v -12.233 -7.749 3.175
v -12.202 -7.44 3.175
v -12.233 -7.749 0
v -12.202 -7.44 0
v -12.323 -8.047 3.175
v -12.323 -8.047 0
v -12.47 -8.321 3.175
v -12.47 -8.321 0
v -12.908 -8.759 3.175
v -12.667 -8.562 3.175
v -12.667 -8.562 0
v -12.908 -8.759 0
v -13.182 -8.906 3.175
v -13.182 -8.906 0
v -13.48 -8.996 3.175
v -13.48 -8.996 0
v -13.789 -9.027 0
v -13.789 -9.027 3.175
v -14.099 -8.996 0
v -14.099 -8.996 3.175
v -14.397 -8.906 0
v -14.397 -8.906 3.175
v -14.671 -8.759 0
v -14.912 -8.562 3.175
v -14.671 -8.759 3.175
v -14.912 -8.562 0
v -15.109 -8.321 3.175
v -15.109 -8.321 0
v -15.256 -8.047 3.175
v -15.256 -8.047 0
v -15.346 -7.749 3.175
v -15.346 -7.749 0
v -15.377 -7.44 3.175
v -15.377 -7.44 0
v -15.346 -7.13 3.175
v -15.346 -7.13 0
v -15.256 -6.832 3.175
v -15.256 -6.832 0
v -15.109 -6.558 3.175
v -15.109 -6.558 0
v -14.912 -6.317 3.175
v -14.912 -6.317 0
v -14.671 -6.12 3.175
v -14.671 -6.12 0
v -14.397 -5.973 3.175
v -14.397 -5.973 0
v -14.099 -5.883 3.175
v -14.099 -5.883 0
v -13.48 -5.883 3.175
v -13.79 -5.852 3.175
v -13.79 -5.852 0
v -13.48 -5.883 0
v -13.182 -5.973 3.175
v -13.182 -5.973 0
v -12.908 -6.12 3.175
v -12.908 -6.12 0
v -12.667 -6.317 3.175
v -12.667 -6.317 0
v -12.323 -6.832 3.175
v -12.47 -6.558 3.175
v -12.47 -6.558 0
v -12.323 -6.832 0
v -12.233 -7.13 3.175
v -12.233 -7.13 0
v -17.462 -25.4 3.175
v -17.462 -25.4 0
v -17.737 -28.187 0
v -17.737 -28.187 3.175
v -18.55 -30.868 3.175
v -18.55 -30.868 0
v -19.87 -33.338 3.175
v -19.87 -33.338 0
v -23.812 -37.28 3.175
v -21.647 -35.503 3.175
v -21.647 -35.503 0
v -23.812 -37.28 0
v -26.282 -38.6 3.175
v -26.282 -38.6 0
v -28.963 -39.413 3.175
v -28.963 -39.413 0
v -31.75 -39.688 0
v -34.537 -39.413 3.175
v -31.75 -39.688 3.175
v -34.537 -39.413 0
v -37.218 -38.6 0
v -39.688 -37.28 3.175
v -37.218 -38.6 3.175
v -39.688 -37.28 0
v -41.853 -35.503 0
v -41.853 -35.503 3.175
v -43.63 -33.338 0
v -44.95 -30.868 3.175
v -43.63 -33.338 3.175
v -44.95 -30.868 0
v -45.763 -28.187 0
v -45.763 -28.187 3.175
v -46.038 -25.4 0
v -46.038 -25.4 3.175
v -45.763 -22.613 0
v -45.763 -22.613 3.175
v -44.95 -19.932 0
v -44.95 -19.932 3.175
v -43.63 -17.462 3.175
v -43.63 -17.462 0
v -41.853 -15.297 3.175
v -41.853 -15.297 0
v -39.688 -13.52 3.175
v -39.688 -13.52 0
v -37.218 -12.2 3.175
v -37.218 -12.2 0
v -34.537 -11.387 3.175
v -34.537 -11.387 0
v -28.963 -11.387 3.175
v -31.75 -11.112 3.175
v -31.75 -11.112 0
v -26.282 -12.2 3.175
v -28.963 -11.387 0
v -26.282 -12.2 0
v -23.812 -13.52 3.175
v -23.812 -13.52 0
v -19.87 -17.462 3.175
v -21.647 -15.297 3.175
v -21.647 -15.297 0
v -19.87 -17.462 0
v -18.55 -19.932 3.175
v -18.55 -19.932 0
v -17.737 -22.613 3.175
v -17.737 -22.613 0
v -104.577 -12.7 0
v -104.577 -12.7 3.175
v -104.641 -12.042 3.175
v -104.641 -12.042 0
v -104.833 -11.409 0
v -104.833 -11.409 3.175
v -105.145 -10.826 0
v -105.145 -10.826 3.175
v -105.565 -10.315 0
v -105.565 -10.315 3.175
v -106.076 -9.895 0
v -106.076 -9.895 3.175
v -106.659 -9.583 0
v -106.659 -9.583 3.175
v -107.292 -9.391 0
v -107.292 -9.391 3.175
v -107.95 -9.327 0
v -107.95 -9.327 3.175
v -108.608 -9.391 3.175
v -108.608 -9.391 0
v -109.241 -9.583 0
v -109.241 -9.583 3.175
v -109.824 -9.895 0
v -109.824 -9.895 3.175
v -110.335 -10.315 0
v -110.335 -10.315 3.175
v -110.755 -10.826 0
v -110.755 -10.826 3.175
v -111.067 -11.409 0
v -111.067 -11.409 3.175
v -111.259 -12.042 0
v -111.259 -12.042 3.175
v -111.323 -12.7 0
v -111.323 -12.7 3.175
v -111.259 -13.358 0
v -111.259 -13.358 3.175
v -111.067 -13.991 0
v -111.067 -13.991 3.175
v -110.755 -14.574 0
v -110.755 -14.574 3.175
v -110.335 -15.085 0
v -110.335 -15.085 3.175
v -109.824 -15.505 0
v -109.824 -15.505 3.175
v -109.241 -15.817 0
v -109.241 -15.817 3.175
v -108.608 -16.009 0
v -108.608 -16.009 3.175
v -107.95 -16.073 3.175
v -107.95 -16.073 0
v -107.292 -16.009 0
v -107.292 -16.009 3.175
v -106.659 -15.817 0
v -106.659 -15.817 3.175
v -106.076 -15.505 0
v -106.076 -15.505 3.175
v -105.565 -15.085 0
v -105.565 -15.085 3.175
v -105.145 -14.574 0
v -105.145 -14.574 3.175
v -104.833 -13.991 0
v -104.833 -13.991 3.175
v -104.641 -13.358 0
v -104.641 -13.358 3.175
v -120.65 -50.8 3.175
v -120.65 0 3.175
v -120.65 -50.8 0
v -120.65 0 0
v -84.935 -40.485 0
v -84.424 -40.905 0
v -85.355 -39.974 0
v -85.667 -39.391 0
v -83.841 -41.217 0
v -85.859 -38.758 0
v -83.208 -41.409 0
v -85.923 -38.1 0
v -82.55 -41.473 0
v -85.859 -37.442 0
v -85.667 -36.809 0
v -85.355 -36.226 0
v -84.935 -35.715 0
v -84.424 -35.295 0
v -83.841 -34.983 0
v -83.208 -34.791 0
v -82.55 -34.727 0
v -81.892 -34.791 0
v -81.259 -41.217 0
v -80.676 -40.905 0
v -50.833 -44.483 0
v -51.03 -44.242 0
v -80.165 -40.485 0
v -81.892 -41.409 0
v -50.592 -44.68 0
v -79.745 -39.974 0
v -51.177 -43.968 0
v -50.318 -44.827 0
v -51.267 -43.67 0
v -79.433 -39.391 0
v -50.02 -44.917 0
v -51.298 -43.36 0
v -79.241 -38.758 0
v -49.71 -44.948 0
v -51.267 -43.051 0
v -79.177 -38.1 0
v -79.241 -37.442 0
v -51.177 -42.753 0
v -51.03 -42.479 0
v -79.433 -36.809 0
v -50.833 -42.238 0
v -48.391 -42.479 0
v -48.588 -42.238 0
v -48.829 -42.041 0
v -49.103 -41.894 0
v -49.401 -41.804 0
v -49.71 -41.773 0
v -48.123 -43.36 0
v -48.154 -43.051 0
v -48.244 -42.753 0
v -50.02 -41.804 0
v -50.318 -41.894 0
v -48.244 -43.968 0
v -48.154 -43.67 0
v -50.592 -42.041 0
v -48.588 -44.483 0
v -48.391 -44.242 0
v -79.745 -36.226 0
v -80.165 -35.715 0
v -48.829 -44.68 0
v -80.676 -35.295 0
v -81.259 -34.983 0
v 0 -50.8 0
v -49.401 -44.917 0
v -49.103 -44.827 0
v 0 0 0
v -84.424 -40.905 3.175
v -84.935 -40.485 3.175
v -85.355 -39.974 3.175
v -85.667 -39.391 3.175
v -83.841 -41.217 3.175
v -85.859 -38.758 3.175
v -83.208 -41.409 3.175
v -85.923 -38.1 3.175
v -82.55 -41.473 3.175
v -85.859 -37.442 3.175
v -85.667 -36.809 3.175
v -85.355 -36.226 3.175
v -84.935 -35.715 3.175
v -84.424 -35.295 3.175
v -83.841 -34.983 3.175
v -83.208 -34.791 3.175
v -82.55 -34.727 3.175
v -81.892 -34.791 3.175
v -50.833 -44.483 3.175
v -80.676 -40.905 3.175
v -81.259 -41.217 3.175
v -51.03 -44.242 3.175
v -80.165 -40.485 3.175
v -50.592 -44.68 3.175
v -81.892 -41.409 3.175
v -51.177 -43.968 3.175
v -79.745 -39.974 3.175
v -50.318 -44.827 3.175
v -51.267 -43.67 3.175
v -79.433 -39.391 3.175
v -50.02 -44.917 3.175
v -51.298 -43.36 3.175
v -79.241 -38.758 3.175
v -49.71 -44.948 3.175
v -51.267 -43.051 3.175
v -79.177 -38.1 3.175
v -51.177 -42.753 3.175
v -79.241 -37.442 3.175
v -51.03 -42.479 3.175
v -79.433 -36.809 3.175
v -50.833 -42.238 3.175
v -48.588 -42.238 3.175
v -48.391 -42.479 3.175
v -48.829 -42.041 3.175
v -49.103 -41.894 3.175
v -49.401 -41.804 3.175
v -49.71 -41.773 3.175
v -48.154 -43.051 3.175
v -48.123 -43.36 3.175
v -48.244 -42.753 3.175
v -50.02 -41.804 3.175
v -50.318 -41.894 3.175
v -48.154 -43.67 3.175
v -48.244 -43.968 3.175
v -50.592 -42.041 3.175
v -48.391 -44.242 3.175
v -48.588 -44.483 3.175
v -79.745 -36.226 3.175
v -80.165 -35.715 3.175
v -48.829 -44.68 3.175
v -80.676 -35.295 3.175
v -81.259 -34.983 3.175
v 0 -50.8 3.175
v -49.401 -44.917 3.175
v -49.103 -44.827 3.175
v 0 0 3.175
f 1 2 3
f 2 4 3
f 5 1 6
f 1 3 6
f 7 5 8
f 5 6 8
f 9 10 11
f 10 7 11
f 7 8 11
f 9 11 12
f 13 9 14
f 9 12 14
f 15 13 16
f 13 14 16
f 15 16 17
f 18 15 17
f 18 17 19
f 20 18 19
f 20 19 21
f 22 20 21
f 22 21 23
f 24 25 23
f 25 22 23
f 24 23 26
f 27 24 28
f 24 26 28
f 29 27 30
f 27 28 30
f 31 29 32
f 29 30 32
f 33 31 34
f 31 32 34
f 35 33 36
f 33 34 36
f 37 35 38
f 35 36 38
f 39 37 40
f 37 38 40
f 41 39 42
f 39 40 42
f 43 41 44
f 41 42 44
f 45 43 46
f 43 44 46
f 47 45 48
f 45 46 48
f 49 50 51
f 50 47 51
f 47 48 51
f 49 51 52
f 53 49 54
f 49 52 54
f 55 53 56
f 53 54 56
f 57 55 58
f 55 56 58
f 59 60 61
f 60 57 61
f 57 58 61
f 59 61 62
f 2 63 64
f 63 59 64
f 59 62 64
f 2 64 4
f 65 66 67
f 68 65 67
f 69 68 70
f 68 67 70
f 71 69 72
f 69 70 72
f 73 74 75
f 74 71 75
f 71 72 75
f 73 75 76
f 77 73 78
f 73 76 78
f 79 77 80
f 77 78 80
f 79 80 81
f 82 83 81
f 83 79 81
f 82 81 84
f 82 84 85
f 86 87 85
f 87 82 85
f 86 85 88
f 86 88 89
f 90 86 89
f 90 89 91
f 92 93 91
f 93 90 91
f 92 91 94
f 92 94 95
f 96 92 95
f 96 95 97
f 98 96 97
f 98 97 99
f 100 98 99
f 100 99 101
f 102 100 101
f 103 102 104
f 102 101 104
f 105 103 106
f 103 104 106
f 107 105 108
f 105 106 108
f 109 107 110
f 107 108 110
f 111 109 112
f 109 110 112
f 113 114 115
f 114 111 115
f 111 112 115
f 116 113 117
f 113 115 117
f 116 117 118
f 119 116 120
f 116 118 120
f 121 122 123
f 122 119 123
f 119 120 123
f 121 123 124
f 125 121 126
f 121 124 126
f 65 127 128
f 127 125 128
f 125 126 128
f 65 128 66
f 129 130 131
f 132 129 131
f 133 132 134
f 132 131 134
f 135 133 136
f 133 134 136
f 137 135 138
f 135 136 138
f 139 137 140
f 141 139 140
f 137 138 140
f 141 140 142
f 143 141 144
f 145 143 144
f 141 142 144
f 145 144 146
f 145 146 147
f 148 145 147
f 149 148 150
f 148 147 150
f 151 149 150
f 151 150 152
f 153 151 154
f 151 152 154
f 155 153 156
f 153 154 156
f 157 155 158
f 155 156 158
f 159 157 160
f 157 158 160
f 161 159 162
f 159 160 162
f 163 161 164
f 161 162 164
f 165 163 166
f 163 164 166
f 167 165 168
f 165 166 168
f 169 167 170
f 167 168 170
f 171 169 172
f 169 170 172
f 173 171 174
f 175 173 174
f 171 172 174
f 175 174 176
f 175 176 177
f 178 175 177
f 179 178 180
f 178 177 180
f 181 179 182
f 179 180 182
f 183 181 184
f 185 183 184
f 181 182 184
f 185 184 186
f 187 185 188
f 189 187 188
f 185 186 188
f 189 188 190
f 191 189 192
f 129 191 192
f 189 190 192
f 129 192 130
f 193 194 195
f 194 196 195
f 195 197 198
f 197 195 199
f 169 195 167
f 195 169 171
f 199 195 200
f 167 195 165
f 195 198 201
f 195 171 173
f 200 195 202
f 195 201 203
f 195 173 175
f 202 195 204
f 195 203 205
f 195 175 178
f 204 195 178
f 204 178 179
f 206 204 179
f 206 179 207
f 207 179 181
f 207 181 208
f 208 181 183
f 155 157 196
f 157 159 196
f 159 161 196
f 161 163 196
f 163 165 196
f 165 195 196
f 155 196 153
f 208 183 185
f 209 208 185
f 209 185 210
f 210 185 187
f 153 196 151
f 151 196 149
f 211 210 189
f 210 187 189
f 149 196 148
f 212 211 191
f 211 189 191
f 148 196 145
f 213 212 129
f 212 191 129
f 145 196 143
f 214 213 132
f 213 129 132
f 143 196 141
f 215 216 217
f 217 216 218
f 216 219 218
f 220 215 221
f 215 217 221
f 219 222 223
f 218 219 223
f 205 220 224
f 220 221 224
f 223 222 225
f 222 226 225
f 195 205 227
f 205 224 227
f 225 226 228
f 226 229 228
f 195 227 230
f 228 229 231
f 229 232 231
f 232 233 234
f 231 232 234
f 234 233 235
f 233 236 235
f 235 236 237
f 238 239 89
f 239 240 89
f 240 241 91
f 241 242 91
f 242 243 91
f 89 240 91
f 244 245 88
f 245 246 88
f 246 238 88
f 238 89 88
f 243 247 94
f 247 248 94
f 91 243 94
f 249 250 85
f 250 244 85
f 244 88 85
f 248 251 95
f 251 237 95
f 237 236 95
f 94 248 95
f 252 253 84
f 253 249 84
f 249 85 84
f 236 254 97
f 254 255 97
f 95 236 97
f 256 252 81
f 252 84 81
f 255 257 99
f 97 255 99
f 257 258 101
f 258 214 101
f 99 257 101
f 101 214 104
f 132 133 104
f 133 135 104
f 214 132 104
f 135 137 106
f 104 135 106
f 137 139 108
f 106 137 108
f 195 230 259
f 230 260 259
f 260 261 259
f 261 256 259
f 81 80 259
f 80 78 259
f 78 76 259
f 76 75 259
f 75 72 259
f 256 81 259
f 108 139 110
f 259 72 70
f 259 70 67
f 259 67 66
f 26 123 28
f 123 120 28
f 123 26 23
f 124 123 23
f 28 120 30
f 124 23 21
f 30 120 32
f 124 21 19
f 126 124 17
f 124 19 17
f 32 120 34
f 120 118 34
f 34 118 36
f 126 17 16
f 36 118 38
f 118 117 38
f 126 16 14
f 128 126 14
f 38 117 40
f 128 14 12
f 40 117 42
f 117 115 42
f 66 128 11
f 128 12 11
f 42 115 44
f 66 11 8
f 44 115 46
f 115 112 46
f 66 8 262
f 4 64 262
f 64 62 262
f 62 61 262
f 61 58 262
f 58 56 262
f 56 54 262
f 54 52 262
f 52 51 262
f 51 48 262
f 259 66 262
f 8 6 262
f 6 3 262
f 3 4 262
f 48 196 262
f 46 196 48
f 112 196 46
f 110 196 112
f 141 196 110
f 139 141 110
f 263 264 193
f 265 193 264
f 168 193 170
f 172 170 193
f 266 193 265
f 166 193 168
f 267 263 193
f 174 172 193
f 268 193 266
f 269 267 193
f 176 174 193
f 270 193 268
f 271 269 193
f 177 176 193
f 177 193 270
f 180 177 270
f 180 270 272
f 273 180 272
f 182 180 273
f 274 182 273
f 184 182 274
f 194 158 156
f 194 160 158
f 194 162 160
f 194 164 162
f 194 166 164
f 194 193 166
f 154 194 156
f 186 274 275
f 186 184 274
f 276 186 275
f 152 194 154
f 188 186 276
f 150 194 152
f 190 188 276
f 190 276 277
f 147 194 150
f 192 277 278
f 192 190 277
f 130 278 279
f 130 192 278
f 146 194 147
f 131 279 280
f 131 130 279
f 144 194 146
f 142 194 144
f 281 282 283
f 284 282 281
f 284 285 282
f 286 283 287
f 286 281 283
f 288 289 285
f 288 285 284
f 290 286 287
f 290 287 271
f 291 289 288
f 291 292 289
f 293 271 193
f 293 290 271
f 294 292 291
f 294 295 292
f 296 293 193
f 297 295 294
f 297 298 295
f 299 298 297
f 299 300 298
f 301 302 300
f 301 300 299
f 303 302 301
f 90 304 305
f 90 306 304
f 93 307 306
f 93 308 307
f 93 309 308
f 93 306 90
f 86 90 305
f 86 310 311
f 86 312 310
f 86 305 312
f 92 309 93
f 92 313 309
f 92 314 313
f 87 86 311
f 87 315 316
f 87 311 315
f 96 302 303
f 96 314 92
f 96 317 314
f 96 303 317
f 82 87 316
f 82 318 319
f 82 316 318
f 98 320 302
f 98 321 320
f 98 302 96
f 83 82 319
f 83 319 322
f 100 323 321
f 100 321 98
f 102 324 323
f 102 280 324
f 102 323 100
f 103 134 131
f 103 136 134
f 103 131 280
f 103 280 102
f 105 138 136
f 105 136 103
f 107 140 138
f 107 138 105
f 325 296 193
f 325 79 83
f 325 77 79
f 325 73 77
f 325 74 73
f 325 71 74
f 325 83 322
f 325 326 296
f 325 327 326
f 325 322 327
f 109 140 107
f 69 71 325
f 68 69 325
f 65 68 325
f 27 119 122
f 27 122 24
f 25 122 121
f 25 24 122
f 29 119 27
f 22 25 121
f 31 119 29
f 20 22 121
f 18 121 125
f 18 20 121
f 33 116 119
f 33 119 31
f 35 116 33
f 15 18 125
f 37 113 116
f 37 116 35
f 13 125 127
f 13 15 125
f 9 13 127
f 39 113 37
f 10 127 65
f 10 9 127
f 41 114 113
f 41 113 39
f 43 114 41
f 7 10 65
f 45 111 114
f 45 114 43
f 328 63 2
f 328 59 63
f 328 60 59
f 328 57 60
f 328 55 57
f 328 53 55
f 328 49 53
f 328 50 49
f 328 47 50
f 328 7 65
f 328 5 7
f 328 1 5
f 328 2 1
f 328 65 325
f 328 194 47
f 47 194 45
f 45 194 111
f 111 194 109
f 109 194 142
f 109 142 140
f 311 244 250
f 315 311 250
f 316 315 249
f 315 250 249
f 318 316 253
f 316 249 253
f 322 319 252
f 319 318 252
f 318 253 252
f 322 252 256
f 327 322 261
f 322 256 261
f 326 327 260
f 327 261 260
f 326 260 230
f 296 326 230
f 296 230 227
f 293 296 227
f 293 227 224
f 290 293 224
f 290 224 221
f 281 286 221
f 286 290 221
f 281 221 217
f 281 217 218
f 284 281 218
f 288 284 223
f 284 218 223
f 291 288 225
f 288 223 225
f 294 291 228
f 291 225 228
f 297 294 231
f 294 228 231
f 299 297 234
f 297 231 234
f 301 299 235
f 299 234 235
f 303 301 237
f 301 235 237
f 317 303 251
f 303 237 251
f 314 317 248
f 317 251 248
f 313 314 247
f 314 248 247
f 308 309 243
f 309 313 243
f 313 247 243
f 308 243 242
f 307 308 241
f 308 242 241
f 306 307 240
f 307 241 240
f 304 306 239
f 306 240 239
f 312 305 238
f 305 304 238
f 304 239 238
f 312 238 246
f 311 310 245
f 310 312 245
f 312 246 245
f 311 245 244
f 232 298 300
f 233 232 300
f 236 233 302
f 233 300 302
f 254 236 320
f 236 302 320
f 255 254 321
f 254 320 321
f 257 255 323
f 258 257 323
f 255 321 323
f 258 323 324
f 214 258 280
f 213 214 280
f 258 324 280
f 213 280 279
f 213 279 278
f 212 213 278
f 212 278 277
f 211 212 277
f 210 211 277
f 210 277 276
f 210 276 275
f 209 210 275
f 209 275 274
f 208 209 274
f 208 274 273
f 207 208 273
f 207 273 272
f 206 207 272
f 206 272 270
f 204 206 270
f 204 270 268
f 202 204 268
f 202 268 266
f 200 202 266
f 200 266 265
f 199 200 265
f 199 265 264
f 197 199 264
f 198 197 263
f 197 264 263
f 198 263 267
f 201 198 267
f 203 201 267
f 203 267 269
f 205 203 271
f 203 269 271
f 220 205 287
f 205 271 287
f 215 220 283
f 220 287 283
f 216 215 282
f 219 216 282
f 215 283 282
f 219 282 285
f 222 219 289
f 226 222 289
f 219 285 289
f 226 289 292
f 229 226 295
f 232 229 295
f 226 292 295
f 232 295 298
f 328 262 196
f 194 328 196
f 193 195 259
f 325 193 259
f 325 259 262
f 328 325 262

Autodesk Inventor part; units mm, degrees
ref_plane "YZ Plane" through (0, 0, 0) normal (1, 0, 0) x (0, 1, 0)
ref_plane "XZ Plane" through (0, 0, 0) normal (0, 1, 0) x (-1, 0, 0)
ref_plane "XY Plane" through (0, 0, 0) normal (0, 0, 1) x (1, 0, 0)
sketch "Sketch1" plane through (0, 0, 0) normal (0, 0, 1) x (1, 0, 0)
  line L0 (0, 0) -> (-120.65, 0)
  line L1 (-120.65, 0) -> (-120.65, -50.8)
  line L2 (-120.65, -50.8) -> (0, -50.8)
  line L3 (0, -50.8) -> (0, 0)
  circle A0 centre (-31.75, -25.4) radius 14.2875
  circle A1 centre (-13.7895, -7.4395) radius 1.5875
  circle A2 centre (-49.7105, -43.3605) radius 1.5875
  dimension "d0" = 28.575
  dimension "d1" = 25.4
  dimension "d2" = 25.4
  dimension "d3" = 50.8
  dimension "d4" = 3.175
  dimension "d5" = 3.175
  dimension "d6" = 25.4
  dimension "d7" = 31.75
  dimension "d8" = 88.9
  dimension "d9" = 17.9605
  dimension "d10" = 17.9605
extrude "Extrusion1" add sketch "Sketch1" along normal blind 3.175
sketch "Sketch2" plane through (0, 0, 3.175) normal (0, 0, 1) x (1, 0, 0)
  circle A0 centre (-107.95, -12.7) radius 3.3734
  line L0 (-120.65, 0) -> (-120.65, -50.8) projected
  line L1 (0, 0) -> (-120.65, 0) projected
  circle A1 centre (-82.55, -38.1) radius 3.3734
  line L2 (-120.65, -50.8) -> (0, -50.8) projected
  dimension "d13" = 6.7469
  dimension "d14" = 12.7
  dimension "d15" = 12.7
  dimension "d16" = 6.7469
  dimension "d17" = 12.7
  dimension "d18" = 38.1
extrude "Extrusion2" cut sketch "Sketch2" against normal blind 3.175
properties part number "secondaryflywheelmount"
